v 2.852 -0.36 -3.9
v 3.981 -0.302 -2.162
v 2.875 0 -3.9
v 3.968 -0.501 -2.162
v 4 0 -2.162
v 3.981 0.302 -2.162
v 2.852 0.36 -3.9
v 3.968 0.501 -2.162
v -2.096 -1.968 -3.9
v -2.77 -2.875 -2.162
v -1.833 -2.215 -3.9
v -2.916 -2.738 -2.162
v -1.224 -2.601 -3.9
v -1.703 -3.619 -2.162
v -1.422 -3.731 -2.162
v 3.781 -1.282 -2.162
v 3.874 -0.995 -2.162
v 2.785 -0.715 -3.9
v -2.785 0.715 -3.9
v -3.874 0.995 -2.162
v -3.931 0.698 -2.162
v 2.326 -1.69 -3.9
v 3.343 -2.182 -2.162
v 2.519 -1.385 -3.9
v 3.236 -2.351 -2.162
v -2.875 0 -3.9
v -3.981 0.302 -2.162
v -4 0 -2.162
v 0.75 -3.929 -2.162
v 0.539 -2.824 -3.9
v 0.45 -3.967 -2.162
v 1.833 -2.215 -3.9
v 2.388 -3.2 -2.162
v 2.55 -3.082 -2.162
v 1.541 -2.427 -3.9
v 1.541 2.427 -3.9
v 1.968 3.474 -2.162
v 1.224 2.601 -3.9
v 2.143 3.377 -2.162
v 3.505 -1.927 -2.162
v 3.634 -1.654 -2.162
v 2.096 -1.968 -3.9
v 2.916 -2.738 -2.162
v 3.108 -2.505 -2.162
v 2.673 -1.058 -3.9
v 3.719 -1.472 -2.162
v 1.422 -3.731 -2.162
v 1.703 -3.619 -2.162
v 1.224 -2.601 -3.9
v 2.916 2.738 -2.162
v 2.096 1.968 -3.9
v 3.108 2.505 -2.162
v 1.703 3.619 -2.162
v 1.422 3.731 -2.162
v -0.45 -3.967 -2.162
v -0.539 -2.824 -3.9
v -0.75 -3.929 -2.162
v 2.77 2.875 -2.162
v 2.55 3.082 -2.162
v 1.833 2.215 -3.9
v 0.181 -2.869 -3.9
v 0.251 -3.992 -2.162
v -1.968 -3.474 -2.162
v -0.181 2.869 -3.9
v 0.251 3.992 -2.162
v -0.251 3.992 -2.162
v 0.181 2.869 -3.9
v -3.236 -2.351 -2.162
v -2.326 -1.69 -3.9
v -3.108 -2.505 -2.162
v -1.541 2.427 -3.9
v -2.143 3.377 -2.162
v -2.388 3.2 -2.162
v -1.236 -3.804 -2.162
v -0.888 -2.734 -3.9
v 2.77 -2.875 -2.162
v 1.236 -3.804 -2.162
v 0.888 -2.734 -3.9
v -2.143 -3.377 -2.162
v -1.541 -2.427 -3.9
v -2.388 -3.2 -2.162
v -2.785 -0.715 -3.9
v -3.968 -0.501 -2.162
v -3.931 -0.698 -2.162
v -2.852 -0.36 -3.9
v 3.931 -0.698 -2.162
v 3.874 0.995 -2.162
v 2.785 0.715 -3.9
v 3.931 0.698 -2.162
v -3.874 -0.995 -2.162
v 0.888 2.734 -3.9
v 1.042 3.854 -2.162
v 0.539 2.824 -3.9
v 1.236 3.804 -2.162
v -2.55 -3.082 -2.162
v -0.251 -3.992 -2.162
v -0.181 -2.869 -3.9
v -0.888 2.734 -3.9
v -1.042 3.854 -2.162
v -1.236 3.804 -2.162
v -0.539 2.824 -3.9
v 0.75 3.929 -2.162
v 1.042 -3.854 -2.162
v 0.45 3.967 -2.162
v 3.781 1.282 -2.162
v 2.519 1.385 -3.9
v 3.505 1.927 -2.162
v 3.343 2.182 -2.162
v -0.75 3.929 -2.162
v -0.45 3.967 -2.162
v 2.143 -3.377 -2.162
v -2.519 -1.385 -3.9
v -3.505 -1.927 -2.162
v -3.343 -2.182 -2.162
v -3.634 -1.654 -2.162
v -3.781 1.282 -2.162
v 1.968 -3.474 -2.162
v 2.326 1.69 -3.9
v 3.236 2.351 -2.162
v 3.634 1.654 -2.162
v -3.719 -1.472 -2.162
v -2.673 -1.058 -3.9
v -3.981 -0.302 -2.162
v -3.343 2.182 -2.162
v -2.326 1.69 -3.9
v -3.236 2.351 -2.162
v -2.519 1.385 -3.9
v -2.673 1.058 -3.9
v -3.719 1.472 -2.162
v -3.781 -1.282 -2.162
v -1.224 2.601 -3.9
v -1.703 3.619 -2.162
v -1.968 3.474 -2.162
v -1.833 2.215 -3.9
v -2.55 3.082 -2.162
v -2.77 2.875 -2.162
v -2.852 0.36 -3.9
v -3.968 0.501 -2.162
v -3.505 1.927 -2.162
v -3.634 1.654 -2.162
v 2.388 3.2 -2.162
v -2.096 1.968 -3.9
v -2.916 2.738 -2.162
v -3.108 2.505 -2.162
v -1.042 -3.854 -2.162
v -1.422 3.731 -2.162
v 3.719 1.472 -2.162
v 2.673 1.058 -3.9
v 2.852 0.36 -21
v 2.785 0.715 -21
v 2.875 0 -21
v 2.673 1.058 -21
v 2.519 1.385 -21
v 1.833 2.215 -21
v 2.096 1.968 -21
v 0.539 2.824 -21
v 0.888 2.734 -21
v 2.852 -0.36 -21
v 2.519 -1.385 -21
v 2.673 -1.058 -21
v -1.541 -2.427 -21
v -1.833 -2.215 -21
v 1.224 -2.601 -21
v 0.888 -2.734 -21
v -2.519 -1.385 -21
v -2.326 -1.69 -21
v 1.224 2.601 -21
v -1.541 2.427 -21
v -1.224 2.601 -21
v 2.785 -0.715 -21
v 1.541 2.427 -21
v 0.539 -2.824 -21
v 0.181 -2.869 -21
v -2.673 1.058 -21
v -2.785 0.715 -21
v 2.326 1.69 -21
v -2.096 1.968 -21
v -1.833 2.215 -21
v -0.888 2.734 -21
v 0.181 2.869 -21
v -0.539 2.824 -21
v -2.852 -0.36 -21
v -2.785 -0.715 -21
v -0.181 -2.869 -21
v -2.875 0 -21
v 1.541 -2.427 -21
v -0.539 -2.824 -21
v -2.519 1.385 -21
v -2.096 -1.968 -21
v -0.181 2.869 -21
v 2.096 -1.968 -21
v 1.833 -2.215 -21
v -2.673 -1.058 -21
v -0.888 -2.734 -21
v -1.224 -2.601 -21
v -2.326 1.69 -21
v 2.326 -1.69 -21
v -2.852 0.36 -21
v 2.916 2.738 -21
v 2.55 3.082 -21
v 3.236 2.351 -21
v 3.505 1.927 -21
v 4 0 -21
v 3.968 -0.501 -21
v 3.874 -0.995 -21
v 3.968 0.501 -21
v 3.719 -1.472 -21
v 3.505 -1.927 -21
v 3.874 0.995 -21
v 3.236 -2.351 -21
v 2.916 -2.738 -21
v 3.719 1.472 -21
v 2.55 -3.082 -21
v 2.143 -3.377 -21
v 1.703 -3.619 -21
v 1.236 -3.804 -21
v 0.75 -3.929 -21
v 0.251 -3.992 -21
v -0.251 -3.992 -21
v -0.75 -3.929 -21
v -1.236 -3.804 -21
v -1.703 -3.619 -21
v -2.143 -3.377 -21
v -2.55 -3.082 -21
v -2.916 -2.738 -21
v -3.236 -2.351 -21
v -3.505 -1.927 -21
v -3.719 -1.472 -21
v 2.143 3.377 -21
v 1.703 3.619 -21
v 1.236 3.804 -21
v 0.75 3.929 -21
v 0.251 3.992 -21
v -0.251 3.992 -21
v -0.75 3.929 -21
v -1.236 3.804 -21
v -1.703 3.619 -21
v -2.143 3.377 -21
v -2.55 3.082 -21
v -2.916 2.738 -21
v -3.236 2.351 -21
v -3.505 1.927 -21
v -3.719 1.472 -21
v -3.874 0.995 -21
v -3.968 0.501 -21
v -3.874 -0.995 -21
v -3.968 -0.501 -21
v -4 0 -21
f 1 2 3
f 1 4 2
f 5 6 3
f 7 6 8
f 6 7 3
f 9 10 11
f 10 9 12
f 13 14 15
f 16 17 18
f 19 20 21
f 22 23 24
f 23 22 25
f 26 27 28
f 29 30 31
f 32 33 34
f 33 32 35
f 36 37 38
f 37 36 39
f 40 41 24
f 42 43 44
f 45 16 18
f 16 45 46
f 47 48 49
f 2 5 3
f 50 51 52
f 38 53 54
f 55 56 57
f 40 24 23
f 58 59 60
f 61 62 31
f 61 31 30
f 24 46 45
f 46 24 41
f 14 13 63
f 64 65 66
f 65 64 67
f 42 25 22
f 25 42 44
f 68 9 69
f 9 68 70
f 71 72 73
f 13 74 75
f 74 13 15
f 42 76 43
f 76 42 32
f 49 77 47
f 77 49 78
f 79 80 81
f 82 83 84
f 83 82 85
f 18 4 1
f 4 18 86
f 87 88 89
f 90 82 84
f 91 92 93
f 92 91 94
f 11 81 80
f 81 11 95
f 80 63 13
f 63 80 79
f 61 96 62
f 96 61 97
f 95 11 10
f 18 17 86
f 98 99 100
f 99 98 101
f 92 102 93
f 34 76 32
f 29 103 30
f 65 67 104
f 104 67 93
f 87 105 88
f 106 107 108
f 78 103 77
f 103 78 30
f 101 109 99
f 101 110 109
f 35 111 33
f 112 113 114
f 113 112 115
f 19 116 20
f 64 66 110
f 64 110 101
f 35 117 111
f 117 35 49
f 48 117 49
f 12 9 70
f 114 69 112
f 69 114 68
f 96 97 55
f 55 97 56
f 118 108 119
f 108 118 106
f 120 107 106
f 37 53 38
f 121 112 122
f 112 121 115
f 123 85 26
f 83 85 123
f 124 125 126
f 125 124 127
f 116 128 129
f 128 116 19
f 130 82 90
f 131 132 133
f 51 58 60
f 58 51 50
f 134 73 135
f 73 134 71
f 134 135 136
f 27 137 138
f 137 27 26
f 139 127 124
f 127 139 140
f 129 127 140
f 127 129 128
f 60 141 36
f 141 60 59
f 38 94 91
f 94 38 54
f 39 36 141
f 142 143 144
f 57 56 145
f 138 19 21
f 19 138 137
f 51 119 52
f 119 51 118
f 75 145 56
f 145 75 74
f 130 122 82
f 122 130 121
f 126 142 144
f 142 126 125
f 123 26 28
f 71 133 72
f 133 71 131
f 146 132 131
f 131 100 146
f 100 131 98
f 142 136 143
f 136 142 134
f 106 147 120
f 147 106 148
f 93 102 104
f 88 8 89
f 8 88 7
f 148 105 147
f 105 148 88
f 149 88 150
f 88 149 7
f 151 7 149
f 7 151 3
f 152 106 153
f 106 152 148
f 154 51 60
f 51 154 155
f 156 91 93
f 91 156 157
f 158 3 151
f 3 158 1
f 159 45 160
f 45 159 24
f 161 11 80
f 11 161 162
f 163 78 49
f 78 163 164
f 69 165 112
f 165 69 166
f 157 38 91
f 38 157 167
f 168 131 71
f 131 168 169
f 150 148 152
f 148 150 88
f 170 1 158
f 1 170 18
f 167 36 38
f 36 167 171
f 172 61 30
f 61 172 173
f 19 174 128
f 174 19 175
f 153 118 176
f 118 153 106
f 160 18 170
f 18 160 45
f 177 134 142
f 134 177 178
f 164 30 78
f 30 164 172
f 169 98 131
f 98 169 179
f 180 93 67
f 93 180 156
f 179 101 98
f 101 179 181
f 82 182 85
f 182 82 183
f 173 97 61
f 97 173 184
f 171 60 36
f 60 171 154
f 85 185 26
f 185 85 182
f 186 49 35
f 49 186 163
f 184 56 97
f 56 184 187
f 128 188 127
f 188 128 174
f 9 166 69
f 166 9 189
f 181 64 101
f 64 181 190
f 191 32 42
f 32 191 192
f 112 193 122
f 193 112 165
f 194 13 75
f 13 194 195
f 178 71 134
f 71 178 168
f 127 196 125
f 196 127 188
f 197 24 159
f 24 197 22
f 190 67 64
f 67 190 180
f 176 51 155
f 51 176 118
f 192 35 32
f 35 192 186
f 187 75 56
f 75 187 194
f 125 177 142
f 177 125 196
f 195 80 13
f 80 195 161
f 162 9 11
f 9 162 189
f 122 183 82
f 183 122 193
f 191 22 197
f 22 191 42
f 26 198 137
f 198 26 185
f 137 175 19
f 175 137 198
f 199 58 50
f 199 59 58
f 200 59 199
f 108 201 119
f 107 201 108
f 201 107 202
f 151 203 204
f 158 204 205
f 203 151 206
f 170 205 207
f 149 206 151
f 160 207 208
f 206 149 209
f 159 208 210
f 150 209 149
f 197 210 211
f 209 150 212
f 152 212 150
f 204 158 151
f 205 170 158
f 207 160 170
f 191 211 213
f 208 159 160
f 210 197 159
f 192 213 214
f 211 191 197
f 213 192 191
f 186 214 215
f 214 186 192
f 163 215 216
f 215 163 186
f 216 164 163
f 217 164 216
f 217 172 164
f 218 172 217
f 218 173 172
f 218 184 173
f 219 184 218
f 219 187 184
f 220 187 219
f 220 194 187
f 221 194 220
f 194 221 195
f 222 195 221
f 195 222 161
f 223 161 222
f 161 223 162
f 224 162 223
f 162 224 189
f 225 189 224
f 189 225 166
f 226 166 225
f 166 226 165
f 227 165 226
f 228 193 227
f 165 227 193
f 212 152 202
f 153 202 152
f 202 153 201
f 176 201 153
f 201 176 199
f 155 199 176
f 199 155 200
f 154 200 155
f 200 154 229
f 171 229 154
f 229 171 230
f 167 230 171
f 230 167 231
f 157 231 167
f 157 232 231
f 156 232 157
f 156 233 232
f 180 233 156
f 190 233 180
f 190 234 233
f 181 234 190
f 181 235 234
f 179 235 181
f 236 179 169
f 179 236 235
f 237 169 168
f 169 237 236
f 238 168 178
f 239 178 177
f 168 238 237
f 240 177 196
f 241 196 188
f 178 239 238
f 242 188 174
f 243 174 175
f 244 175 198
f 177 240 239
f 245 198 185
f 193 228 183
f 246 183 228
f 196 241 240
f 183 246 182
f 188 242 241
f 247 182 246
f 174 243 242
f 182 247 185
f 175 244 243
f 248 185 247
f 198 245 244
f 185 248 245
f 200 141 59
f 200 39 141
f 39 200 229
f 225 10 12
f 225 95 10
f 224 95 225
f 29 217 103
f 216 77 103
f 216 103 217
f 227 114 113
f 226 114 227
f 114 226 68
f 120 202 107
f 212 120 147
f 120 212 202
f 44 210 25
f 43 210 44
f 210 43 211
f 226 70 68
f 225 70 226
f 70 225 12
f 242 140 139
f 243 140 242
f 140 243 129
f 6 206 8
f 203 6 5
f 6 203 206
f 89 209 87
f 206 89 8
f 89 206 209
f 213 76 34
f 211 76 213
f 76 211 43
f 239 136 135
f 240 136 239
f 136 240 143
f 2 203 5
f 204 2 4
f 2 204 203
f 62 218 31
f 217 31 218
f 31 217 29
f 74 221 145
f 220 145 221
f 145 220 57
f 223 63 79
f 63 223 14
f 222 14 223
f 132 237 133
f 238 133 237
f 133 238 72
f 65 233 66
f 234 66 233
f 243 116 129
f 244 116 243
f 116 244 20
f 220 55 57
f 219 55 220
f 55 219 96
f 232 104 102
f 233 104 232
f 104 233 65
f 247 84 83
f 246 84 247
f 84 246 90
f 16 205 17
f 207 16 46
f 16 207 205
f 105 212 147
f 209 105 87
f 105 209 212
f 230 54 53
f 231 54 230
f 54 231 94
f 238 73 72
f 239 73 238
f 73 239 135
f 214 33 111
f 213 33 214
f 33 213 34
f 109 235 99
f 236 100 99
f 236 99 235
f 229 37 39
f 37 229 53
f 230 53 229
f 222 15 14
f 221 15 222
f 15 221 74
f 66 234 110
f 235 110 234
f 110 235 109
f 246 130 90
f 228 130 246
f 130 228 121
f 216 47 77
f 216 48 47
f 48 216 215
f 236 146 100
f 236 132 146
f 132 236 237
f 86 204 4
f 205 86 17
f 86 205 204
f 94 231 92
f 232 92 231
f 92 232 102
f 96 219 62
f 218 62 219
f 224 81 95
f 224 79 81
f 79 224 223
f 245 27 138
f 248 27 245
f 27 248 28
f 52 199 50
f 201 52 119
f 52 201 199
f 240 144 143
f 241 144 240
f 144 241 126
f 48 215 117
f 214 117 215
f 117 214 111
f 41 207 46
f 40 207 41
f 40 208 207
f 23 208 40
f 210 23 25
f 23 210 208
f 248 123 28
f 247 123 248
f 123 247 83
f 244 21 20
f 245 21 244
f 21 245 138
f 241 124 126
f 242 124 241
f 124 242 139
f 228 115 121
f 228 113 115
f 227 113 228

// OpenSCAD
$fn = 50;

difference() {
	union() {
		translate(v = [0, 0, -21.0]) {
			cylinder(h = 21, r = 4.0);
		}
	}
	union() {
		translate(v = [0, 0, 0]) {
			rotate(a = [0, 0, 0]) {
				difference() {
					union() {
						translate(v = [0, 0, -24.0]) {
							cylinder(h = 24, r = 2.6);
						}
						translate(v = [0, 0, -3.9]) {
							cylinder(h = 3.9, r1 = 2.875, r2 = 5.4);
						}
						translate(v = [0, 0, -24.0]) {
							cylinder(h = 24, r = 2.875);
						}
						translate(v = [0, 0, -24.0]) {
							cylinder(h = 24, r = 2.6);
						}
					}
					union();
				}
			}
		}
	}
}
